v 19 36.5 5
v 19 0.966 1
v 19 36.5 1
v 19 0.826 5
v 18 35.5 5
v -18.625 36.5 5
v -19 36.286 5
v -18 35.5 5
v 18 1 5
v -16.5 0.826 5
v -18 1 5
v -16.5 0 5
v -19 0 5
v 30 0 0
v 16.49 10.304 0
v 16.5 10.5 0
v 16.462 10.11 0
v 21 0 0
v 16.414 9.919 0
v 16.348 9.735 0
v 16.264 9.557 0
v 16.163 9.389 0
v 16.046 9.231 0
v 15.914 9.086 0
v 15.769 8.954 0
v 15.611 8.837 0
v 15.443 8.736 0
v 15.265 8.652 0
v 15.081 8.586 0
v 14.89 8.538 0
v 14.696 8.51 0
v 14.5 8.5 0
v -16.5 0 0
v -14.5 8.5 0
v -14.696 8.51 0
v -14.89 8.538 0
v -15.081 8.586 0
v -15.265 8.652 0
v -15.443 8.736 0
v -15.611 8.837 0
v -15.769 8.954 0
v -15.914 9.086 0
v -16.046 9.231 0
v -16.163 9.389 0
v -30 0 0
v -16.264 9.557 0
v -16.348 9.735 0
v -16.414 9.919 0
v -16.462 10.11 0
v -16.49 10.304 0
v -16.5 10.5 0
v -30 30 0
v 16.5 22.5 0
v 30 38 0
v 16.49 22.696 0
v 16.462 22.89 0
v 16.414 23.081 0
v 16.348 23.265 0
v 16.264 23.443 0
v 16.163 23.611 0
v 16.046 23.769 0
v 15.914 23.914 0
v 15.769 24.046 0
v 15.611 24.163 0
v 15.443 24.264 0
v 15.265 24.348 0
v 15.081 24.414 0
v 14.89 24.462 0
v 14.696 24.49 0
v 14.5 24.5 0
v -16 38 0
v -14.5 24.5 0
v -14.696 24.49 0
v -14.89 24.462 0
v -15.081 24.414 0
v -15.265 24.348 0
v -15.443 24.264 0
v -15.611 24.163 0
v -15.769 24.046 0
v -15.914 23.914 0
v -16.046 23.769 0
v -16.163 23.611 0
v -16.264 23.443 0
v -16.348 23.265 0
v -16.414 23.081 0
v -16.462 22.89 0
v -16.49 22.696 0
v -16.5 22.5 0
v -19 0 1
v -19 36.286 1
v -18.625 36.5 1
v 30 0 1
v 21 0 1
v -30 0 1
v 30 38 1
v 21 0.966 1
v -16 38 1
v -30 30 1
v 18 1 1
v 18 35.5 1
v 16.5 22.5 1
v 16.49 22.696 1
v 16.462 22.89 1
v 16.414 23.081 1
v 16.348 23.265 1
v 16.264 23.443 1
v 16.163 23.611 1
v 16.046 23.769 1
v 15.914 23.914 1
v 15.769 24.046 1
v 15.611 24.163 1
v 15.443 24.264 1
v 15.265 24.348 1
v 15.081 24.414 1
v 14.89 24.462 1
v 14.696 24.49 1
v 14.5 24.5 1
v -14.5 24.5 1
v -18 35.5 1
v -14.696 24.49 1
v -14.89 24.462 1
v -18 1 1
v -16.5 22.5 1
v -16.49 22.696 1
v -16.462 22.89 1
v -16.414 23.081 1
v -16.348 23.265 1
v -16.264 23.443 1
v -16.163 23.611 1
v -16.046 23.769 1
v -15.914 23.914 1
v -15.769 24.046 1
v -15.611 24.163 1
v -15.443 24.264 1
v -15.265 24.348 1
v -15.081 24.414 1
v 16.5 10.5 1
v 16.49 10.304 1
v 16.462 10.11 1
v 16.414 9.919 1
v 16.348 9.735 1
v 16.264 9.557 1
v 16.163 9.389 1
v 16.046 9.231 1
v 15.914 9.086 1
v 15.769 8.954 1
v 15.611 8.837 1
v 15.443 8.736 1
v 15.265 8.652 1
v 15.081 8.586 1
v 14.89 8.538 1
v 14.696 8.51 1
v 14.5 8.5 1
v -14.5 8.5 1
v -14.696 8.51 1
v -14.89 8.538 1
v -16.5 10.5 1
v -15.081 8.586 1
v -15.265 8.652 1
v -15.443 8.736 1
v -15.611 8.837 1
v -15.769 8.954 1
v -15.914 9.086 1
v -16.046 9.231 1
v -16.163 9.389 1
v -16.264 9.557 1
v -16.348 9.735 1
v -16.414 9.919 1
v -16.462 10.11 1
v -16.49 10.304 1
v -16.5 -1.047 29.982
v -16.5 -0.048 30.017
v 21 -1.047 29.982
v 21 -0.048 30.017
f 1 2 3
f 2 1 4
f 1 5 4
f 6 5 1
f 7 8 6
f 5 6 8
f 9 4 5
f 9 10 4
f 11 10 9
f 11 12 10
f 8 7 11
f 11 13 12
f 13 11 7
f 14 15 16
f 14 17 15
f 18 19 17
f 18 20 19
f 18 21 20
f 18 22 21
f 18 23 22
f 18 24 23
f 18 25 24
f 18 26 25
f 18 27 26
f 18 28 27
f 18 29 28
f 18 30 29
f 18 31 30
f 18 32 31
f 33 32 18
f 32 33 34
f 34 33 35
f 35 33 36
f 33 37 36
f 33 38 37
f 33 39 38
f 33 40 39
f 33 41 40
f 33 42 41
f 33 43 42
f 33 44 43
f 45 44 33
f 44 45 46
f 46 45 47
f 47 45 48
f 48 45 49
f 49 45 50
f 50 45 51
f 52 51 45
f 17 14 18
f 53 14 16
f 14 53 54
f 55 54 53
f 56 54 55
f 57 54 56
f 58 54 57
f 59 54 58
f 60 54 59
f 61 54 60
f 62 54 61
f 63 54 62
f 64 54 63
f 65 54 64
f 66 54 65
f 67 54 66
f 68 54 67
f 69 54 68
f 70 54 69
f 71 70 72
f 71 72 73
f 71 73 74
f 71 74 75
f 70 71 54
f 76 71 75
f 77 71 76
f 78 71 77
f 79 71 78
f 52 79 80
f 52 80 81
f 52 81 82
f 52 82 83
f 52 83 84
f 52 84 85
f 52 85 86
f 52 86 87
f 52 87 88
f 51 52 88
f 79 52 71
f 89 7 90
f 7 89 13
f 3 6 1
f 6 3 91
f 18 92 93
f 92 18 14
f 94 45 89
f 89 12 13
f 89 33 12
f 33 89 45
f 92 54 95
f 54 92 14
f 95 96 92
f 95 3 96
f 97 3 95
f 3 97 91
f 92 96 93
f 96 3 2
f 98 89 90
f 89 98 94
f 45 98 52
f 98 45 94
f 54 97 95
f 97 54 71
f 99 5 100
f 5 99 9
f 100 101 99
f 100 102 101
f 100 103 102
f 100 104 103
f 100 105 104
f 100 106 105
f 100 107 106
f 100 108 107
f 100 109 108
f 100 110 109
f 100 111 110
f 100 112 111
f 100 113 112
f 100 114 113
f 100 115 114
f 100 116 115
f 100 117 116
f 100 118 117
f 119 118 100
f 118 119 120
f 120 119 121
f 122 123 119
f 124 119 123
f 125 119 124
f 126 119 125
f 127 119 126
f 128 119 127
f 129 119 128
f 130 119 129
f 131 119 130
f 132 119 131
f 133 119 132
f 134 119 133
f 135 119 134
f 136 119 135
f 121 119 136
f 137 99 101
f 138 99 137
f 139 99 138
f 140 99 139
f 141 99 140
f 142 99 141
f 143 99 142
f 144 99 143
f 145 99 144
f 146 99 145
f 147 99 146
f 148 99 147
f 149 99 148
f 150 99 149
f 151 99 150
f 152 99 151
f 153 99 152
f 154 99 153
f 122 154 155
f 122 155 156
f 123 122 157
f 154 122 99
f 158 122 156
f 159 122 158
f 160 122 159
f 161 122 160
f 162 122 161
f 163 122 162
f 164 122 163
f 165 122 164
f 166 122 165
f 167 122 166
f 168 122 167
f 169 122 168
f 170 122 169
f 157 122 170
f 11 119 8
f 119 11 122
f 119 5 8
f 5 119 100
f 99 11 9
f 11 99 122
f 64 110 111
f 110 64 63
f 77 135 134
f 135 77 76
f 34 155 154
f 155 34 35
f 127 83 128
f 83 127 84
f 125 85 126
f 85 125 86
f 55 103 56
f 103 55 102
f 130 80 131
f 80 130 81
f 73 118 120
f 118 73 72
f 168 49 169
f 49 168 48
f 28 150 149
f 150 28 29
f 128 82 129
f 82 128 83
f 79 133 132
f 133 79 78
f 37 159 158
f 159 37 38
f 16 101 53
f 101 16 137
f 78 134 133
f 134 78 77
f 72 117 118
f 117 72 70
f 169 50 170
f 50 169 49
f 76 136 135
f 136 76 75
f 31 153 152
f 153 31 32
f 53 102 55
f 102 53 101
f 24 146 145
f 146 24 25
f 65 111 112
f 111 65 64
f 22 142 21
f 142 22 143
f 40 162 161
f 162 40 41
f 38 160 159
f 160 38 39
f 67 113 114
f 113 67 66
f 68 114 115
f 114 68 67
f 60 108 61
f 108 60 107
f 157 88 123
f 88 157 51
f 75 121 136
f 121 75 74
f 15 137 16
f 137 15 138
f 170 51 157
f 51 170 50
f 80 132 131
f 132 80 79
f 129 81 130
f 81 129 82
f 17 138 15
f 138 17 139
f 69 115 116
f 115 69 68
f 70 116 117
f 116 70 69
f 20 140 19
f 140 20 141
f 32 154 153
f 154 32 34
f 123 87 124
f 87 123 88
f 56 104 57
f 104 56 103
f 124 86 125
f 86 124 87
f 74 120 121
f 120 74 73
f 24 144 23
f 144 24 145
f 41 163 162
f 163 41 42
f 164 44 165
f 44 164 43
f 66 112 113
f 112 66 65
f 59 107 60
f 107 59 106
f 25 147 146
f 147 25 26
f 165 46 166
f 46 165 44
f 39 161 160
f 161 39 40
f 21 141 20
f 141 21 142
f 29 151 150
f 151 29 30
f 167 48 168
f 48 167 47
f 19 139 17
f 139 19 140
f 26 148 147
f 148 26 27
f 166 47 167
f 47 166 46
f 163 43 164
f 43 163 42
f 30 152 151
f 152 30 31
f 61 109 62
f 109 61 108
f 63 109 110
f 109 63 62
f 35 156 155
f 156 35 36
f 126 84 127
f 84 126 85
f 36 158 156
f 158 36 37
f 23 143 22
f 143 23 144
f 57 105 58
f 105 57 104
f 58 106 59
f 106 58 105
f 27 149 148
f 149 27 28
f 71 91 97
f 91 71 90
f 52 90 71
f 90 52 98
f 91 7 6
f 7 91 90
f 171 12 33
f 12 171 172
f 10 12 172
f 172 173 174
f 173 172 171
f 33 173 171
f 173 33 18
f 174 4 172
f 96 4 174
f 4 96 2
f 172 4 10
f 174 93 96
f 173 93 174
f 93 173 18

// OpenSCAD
$fn=64;
e=0.01;
dw=36;
dh=34.5;
box_draft_angle=2;

module rounded_corner_box(coords=[10,10,10], r=1) {
  hull() {
    translate([0+r, 0+r, 0]) cylinder(r=r, h=coords[2]);
    translate([coords[0]-r, 0+r, 0]) cylinder(r=r, h=coords[2]);
    translate([coords[0]-r, coords[1]-r, 0]) cylinder(r=r, h=coords[2]);
    translate([0+r, coords[1]-r, 0]) cylinder(r=r, h=coords[2]);
  }
}

difference() {
  union() {
    translate([-(dw+2)/2, 0, 0]) cube([dw+2,dh+2,5]);
    translate([-60/2, 0, 0]) cube([60, 38, 1]);
  }
  translate([-dw/2, 1, 1]) cube([dw,dh,5]);
  translate([-(dw-3)/2, 7+3/2, -e]) color("blue") rounded_corner_box([dw-3, 19-3, 10], r=2);

  translate([0, 0, -3])
  linear_extrude(height=10)
    polygon(points=[ [-dw/2+2, 38], [-60/2, 38], [-60/2, 30] ]);
}

rotate([box_draft_angle,0,0])
translate([-55/2+11, 0, 0]) cube([55-11-6.5, 1, 30]);
